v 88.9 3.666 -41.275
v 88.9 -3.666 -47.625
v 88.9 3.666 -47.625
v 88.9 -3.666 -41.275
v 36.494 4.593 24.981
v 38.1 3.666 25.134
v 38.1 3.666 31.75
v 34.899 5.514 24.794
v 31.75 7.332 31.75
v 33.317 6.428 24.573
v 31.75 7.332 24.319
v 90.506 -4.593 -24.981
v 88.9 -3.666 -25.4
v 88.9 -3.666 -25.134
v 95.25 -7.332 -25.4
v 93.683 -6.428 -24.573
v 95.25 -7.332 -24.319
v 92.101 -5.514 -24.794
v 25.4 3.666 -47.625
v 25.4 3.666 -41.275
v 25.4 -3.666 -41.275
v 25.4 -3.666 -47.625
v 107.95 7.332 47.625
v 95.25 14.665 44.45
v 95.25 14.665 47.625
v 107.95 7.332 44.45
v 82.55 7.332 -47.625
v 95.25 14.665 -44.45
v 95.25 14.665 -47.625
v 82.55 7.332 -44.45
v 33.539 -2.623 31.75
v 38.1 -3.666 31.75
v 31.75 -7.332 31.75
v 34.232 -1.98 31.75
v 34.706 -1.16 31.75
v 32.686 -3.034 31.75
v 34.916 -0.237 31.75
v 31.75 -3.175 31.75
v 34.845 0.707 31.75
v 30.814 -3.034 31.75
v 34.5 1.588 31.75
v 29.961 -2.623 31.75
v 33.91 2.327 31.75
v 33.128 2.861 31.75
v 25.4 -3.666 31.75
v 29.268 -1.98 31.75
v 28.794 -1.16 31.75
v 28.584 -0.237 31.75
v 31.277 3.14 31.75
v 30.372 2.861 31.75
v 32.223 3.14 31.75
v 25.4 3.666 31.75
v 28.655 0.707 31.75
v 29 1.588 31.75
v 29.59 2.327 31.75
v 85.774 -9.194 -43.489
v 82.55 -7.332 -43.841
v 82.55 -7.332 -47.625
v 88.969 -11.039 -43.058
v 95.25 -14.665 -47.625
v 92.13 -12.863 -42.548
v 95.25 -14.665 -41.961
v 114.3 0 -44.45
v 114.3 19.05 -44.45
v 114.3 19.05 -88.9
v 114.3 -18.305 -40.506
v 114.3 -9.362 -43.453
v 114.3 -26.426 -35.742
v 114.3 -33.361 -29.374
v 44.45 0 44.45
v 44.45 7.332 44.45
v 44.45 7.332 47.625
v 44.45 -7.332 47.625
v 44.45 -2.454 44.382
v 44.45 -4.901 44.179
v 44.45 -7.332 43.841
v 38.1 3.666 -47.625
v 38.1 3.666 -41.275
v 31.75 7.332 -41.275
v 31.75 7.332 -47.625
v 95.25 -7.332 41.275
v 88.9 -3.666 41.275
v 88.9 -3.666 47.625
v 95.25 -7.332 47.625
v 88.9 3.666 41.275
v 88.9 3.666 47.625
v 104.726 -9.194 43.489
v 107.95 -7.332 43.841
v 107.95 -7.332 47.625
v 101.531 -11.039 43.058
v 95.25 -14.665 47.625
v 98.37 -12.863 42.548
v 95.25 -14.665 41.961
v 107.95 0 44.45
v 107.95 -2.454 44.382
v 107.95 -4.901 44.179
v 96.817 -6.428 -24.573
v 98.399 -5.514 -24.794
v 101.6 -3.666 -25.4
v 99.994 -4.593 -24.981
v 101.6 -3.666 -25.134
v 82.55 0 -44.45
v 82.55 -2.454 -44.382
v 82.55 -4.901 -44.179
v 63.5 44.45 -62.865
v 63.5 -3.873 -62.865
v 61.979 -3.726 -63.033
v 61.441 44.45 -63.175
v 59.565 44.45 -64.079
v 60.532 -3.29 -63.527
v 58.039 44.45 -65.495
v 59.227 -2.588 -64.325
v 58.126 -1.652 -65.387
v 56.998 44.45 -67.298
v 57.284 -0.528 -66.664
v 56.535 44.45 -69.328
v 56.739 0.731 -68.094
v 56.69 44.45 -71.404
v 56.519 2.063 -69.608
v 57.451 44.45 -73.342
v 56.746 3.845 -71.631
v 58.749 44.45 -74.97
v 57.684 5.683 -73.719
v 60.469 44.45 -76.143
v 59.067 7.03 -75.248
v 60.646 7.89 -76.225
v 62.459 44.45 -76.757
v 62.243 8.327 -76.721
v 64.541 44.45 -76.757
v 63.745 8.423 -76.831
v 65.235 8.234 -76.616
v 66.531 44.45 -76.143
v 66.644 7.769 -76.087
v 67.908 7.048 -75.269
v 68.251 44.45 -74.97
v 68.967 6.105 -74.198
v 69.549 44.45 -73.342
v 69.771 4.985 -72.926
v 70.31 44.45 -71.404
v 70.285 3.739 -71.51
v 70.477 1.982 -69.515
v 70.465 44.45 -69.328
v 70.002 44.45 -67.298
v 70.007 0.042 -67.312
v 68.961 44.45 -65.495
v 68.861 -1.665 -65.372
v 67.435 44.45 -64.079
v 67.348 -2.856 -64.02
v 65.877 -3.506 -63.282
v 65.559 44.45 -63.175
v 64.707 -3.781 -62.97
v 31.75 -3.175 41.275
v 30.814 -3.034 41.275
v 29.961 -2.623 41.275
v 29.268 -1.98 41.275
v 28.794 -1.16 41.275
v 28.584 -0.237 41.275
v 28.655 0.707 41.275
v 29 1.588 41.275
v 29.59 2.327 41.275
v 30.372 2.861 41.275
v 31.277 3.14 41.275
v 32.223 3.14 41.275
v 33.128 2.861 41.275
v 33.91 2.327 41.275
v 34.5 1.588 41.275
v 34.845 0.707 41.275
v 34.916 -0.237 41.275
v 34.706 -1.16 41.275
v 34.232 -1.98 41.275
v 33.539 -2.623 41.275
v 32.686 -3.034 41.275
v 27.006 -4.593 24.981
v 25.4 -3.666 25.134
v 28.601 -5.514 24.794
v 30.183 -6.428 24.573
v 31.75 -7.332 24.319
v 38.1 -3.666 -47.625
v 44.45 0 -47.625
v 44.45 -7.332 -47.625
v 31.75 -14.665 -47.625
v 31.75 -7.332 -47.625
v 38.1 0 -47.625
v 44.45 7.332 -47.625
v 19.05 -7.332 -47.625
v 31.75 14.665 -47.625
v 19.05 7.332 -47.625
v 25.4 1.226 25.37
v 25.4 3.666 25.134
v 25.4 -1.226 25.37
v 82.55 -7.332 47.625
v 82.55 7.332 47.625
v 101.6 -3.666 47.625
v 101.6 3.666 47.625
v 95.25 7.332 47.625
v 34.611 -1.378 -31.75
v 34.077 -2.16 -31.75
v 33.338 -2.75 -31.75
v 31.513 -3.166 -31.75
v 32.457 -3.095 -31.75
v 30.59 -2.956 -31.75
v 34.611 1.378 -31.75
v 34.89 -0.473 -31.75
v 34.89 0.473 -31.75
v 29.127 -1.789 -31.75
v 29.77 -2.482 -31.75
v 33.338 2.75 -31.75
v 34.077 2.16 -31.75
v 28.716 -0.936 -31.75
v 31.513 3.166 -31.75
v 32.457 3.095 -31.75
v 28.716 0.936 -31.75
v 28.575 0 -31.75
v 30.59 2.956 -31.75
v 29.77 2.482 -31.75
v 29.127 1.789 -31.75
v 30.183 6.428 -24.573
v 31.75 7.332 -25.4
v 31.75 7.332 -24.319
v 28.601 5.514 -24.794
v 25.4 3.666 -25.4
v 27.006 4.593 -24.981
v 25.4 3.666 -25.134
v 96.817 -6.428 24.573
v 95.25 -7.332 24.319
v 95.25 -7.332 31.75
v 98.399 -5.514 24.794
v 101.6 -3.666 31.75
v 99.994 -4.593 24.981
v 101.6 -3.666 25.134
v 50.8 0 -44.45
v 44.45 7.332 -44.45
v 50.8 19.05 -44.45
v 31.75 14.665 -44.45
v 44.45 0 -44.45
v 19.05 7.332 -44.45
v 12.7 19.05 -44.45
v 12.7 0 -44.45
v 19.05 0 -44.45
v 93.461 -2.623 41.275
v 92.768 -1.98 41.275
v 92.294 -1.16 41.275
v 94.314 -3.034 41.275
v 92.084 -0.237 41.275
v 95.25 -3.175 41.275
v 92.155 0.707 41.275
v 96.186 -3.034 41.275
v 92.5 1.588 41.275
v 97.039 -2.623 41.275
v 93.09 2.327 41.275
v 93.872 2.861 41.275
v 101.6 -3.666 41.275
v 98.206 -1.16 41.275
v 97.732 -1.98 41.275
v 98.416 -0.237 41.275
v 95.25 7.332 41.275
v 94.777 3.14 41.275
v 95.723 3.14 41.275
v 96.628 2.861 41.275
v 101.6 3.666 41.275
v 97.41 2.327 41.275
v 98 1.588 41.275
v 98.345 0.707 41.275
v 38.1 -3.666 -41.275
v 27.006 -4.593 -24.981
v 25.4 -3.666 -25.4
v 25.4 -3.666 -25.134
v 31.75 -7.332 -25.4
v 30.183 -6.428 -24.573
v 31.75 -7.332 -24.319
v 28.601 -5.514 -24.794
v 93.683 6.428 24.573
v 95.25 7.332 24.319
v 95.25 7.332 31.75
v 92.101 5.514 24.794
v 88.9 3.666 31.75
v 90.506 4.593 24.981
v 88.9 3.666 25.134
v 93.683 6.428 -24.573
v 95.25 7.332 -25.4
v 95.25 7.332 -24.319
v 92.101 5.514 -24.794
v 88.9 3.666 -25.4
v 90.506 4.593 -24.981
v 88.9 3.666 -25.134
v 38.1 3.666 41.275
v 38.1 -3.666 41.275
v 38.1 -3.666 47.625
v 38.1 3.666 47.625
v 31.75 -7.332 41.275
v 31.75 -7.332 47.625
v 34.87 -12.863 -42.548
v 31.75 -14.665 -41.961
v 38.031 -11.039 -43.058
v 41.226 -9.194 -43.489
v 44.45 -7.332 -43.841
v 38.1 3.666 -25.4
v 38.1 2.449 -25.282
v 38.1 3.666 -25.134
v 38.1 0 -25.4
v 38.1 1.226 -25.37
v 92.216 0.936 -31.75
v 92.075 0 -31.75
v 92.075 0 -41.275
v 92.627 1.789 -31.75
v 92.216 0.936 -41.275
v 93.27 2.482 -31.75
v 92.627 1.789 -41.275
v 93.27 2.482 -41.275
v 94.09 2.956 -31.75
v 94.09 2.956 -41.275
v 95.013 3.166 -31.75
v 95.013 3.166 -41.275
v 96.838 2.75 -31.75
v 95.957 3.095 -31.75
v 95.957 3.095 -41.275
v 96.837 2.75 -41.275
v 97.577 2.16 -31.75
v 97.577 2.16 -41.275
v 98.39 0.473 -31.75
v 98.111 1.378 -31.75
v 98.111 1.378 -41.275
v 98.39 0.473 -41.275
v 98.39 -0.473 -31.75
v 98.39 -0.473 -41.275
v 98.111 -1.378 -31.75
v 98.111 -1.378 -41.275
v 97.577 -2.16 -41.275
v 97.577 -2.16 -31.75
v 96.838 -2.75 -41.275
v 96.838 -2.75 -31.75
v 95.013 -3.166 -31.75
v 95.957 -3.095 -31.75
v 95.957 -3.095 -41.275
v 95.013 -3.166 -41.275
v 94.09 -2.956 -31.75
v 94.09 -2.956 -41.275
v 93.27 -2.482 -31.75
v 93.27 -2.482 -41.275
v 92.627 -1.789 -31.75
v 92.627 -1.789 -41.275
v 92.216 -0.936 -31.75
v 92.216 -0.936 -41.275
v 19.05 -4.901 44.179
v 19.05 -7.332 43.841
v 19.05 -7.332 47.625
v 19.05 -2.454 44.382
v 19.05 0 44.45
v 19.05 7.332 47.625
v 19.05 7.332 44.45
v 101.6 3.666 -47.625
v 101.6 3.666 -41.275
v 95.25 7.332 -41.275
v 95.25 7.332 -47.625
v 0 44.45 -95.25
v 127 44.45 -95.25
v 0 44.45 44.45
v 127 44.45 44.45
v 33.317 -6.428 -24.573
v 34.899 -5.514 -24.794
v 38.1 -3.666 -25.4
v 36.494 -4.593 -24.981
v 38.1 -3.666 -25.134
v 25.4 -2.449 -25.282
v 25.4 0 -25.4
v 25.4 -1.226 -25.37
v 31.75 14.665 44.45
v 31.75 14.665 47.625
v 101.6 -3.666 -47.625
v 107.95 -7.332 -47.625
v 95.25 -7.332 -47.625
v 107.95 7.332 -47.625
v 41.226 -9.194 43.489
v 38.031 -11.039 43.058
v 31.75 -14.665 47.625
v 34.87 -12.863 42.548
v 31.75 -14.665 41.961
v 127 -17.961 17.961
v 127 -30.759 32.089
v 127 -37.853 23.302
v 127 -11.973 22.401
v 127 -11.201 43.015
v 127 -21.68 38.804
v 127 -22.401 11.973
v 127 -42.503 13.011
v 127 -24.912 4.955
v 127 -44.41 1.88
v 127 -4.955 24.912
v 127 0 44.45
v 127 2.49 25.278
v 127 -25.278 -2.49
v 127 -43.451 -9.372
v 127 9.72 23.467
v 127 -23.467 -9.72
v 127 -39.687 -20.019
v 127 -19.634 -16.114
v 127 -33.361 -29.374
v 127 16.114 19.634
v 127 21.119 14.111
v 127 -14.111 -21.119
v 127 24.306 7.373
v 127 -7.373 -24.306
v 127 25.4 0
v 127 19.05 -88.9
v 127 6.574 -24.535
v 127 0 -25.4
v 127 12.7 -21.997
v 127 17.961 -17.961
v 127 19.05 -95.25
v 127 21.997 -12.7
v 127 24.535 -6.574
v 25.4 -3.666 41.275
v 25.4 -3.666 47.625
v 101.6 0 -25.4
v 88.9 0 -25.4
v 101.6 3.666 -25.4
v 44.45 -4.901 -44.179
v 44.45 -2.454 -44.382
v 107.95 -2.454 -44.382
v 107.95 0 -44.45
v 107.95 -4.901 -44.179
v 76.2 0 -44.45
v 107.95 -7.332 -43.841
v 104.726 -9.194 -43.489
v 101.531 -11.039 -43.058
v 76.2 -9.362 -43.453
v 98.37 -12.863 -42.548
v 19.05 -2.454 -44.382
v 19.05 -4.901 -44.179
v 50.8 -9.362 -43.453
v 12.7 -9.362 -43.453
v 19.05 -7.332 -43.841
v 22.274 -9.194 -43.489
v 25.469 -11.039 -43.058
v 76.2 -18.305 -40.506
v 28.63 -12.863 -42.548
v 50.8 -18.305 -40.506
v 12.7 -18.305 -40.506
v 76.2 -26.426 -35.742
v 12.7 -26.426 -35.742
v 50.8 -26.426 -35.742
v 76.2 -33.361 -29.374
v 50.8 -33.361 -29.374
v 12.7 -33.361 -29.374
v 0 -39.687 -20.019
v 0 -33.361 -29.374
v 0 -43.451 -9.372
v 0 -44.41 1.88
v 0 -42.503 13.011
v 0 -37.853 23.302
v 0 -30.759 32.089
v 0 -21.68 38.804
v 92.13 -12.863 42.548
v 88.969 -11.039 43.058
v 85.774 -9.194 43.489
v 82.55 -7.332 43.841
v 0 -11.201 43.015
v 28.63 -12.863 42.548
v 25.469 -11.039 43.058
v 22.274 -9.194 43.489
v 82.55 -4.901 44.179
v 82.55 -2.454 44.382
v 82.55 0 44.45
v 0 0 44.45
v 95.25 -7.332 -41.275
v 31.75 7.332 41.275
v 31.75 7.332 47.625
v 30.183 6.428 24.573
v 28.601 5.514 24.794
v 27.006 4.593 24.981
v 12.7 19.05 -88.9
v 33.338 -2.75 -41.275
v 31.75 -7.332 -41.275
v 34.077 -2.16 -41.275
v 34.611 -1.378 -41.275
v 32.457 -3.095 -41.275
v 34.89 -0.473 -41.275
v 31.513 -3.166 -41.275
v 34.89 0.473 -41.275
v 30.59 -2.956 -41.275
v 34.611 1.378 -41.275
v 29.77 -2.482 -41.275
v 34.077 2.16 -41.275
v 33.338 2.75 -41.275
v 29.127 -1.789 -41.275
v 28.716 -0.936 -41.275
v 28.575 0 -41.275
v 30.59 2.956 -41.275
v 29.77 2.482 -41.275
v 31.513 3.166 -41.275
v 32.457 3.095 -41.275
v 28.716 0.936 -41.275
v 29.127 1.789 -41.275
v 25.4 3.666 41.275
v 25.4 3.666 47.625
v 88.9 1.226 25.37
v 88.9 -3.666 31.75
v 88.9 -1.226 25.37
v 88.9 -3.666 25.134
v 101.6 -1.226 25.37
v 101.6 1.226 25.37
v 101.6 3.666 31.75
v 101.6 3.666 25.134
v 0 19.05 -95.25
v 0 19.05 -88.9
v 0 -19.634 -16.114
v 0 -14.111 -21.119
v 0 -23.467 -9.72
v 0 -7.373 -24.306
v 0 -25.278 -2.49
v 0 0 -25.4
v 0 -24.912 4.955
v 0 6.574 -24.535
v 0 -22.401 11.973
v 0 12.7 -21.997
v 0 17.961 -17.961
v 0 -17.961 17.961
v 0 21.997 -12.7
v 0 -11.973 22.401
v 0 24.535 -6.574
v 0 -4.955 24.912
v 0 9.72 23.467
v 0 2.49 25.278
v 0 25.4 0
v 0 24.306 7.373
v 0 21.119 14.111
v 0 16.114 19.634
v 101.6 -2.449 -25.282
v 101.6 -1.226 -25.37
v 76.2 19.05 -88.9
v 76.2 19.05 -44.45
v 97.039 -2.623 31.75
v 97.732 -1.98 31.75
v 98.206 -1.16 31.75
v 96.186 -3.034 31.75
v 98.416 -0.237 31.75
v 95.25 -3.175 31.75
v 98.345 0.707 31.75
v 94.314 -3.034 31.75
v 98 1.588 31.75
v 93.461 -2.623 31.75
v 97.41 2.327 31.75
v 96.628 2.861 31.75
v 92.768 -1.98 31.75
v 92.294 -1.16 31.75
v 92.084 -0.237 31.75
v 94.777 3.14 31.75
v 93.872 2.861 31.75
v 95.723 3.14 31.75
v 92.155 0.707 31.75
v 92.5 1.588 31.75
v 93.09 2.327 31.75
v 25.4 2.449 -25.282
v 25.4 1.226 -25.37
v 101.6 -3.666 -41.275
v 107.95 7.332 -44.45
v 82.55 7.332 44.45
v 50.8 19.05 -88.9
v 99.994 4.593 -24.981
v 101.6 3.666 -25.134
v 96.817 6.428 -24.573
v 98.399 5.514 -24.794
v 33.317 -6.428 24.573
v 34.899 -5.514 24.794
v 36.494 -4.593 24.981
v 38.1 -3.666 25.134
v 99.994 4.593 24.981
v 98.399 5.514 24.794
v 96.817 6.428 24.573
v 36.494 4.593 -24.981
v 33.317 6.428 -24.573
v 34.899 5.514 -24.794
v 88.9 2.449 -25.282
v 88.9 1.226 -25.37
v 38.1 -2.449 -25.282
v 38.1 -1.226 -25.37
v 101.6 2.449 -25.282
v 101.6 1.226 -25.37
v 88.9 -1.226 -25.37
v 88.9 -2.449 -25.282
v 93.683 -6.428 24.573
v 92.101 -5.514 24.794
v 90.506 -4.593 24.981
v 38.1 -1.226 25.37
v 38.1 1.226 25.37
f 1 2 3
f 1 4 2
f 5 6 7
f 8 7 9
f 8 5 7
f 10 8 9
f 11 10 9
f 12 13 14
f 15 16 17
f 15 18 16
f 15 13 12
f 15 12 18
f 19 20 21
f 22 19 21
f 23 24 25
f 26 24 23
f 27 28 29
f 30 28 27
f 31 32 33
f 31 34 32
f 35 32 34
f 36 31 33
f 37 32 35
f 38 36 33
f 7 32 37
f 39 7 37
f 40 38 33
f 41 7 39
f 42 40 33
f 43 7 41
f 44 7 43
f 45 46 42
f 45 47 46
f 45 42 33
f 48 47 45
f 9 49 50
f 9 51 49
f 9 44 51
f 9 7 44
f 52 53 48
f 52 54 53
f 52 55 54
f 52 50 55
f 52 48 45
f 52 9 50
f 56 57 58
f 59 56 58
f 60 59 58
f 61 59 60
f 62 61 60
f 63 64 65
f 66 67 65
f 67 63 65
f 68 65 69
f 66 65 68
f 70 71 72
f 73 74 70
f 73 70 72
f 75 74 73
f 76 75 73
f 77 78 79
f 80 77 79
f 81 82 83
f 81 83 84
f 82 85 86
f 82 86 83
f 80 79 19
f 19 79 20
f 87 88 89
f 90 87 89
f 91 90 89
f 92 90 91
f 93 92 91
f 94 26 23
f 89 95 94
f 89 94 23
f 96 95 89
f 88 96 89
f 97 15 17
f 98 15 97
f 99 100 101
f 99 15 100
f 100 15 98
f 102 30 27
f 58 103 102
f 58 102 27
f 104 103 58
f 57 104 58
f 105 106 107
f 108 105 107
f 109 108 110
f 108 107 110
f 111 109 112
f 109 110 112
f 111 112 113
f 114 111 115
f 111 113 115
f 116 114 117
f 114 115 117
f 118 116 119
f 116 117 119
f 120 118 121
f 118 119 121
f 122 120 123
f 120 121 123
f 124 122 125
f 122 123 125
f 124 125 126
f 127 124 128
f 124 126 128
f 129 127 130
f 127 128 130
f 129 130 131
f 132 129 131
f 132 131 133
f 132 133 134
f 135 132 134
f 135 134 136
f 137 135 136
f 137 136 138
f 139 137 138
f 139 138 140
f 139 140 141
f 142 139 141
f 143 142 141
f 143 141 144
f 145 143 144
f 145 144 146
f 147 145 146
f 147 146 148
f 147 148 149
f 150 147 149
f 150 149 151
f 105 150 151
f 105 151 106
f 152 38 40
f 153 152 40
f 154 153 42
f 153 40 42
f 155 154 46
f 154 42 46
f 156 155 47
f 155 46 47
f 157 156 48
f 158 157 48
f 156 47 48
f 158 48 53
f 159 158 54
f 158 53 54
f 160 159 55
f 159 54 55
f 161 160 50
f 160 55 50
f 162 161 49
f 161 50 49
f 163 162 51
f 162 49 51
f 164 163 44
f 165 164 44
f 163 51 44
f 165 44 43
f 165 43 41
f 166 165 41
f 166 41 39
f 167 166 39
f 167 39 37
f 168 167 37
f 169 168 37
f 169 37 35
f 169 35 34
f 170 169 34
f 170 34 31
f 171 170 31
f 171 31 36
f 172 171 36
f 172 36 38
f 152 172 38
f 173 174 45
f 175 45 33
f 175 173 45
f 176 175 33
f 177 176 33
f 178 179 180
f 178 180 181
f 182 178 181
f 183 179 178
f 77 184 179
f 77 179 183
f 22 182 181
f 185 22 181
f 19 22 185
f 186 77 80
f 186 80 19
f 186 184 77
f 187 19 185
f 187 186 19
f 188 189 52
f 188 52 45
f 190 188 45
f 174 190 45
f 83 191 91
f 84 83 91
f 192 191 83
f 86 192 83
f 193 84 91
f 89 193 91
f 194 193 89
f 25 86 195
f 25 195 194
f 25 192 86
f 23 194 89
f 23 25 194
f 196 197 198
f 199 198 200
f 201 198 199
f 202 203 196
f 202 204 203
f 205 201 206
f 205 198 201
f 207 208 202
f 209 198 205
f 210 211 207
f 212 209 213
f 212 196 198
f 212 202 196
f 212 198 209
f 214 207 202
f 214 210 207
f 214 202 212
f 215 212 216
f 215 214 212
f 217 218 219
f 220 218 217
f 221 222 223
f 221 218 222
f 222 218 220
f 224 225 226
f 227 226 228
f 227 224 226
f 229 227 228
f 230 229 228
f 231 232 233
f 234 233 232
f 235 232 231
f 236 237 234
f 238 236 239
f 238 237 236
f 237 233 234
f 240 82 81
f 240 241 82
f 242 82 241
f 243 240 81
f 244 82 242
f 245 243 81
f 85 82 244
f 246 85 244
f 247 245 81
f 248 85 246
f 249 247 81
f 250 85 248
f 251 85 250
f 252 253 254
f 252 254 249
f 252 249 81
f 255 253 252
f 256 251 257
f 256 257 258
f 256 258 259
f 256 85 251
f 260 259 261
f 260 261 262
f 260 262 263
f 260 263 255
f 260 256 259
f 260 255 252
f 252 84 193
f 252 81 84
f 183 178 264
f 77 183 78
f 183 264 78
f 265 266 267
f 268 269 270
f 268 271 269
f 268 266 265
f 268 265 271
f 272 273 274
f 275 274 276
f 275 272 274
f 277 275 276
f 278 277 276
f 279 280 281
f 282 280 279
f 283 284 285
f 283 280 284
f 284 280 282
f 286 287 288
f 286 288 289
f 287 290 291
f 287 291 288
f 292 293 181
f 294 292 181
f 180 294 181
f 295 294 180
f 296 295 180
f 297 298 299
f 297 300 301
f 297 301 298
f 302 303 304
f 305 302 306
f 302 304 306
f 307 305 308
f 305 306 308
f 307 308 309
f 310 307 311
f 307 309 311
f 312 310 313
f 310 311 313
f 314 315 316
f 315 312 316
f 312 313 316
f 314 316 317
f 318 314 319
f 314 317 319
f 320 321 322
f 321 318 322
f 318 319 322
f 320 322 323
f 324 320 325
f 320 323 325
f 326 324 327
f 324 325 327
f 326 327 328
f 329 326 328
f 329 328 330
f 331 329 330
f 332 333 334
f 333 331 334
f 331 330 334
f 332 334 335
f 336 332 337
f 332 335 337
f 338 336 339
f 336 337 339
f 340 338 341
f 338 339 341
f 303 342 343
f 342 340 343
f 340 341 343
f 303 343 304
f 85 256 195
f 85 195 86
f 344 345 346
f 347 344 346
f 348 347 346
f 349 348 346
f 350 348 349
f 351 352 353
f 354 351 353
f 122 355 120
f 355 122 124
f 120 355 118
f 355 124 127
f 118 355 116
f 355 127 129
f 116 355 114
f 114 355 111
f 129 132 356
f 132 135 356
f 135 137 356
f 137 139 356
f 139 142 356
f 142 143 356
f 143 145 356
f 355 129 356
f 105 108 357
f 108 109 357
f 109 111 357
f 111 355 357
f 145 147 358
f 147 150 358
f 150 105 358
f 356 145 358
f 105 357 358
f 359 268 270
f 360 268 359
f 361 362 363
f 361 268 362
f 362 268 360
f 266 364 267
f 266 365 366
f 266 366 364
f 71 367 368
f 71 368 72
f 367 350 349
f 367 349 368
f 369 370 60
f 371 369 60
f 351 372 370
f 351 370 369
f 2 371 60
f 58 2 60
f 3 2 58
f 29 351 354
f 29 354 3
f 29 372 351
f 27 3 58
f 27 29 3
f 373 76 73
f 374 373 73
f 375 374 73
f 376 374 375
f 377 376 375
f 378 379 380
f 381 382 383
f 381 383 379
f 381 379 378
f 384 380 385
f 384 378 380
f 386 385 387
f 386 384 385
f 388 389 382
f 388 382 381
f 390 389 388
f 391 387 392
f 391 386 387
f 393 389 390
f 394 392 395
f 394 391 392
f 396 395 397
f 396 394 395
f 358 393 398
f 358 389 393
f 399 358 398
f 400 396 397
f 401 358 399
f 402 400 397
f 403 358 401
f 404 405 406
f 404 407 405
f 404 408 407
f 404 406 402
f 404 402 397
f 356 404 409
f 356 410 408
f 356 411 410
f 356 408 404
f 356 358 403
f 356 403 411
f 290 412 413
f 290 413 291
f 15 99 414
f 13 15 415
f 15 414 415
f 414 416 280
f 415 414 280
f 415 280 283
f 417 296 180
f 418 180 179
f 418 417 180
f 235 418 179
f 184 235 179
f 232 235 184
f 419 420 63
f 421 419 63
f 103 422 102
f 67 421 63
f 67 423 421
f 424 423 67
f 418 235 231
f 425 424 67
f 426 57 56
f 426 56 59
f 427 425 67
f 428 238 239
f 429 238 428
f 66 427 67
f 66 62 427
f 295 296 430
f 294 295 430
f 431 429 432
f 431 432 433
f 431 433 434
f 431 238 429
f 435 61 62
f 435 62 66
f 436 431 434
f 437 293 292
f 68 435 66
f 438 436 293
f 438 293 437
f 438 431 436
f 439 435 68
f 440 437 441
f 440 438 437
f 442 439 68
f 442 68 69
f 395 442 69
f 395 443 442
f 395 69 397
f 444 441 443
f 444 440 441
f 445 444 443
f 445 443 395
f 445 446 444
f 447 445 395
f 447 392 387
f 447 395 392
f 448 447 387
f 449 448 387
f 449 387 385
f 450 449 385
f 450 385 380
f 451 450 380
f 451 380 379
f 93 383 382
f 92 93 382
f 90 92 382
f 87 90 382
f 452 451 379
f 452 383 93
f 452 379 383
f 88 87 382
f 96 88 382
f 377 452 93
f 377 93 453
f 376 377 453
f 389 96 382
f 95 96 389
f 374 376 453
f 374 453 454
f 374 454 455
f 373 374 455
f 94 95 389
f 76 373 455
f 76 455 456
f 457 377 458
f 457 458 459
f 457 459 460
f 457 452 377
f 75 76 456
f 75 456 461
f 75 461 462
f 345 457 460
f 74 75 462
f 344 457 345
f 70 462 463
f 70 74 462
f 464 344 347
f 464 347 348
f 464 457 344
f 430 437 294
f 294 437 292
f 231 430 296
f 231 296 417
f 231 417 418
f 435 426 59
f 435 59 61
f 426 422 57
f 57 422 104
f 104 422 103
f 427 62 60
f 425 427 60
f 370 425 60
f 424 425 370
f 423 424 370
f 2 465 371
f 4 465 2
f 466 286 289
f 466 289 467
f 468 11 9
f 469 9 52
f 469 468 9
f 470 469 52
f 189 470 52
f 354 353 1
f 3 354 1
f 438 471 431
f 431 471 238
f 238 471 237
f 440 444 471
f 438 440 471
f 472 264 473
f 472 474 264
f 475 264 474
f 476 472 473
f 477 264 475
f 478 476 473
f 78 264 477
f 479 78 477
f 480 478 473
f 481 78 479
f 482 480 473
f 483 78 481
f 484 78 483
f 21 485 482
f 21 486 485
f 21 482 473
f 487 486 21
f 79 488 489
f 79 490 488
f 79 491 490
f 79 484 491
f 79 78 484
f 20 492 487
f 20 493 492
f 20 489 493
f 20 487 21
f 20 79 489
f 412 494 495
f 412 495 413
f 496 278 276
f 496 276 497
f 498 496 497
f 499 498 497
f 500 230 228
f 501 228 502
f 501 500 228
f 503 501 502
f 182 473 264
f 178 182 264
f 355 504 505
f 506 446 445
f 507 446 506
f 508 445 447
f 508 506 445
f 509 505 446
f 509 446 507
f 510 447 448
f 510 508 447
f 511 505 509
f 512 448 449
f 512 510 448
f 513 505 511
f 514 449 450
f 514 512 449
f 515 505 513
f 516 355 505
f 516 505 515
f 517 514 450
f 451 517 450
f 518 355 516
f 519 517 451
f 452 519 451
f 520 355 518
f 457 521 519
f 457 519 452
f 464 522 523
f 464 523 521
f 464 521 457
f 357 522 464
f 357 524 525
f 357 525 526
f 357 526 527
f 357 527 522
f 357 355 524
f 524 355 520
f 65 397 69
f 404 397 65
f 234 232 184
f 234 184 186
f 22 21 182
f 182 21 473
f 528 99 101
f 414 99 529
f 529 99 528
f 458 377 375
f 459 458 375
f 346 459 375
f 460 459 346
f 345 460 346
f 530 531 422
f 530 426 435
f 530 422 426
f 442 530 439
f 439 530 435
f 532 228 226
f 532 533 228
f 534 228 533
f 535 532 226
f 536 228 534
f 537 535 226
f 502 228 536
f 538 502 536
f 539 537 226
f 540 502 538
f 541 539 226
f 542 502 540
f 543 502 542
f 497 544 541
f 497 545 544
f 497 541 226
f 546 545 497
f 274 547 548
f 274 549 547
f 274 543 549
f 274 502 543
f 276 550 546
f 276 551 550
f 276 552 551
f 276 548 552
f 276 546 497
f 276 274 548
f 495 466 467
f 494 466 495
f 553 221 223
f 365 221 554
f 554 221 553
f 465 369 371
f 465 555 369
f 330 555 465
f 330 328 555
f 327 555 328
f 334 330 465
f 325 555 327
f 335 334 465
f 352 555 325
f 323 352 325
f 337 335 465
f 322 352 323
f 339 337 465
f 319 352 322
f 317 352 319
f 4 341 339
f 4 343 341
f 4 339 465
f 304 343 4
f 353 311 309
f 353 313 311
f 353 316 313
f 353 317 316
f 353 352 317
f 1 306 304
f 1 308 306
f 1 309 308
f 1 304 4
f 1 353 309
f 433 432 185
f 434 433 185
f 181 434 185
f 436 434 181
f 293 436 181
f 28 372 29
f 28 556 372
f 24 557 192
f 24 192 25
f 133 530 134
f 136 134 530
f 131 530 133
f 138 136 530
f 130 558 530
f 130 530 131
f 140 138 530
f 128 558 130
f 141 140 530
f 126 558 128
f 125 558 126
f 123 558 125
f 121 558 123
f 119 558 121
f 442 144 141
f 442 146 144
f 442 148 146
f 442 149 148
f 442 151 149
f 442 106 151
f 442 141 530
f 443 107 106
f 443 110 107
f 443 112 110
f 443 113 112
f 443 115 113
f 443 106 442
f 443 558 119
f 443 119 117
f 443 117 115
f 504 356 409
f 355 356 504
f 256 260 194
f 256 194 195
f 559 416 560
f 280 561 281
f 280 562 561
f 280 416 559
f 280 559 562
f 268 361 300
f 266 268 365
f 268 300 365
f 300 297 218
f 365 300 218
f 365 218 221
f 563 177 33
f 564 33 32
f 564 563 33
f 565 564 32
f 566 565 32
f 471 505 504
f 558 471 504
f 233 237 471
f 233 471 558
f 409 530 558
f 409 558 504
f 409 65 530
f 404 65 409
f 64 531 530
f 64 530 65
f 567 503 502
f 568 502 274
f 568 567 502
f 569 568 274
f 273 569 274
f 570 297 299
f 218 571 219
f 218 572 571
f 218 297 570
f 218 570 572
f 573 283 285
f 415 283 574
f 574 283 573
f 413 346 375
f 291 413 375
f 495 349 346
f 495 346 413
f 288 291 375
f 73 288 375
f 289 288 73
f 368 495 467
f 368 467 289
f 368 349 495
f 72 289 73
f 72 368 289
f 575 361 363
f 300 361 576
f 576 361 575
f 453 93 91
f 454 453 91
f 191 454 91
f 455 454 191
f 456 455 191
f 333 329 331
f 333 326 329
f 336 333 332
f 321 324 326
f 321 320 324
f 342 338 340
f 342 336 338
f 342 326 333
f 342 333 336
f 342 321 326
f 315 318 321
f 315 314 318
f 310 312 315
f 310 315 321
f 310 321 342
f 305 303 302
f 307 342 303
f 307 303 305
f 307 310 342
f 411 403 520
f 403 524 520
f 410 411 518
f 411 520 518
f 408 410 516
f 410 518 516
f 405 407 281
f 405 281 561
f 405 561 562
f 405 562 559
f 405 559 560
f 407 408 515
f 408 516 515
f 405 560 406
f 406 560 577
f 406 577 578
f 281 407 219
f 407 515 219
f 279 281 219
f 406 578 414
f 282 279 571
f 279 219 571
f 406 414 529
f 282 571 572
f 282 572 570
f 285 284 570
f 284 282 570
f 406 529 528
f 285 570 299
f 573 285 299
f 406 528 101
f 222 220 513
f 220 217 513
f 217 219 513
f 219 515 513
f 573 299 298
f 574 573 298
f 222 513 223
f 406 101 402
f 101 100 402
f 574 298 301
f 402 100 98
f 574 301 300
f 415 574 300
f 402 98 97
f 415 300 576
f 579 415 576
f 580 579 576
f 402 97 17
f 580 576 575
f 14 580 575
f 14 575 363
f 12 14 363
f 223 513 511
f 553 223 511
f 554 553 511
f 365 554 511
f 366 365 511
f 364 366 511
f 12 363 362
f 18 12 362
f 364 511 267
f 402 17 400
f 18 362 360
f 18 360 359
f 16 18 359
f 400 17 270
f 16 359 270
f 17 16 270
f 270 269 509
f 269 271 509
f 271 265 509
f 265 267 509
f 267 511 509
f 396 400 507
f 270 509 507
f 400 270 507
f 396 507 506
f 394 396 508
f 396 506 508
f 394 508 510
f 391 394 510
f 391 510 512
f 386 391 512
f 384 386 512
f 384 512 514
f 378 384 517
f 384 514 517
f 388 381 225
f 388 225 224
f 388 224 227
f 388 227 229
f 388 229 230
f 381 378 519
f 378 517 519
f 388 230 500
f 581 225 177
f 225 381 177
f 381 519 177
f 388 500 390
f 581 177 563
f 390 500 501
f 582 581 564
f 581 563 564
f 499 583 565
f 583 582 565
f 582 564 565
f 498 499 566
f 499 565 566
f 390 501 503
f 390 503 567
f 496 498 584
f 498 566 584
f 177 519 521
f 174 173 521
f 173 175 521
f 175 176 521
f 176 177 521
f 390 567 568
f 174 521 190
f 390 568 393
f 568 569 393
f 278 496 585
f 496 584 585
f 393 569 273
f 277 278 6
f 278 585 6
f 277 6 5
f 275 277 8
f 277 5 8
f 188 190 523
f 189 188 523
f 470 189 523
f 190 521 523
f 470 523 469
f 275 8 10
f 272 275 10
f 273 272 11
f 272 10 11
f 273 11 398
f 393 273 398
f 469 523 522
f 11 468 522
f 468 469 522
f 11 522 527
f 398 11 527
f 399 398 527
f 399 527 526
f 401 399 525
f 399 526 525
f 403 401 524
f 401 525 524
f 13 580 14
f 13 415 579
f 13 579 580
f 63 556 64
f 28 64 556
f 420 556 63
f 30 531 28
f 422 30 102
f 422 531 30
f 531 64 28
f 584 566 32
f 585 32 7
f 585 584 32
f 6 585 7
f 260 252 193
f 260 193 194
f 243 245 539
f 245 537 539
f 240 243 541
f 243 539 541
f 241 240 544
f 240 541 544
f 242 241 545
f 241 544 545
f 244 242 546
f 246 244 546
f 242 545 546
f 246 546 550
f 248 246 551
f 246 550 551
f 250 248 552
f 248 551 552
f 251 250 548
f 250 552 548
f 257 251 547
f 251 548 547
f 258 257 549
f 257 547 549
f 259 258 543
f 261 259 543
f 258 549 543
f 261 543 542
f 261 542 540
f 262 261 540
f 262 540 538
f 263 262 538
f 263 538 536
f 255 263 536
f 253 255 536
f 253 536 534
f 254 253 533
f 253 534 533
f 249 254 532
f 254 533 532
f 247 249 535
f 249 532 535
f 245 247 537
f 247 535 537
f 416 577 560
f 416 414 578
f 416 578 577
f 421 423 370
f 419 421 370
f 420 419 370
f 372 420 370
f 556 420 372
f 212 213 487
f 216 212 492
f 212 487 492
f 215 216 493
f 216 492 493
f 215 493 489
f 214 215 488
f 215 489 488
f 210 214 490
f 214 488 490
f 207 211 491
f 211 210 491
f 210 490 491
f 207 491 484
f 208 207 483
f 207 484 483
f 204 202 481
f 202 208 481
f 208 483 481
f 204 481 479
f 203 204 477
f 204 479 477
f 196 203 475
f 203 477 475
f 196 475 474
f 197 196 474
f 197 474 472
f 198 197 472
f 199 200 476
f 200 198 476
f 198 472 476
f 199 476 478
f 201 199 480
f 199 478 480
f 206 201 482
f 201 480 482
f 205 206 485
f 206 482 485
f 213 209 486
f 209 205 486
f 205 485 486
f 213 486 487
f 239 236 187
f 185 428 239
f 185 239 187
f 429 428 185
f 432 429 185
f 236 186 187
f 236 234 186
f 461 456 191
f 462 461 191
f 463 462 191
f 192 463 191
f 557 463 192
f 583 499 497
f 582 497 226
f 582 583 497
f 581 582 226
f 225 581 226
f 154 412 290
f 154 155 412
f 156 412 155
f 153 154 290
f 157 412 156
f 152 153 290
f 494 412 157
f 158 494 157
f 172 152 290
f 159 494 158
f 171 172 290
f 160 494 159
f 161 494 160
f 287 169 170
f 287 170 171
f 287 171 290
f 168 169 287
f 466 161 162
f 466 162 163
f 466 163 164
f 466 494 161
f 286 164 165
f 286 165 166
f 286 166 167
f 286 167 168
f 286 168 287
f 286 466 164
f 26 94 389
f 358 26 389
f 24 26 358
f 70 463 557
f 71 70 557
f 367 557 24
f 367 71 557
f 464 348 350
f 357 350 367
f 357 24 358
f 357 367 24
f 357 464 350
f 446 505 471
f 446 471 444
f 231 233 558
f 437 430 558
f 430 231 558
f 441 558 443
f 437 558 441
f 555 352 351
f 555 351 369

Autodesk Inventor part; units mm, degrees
ref_plane "YZ Plane" through (0, 0, 0) normal (1, 0, 0) x (0, 1, 0)
sketch "Sketch2" plane through (0, 0, 0) normal (1, 0, 0) x (0, 1, 0)
  circle A0 centre (0, 0) radius 25.4
  arc A1 (0, 44.45) -> (0, -44.45) centre (0, 0) ccw
  line L0 (0, -44.45) -> (0, 25.4)
  line L1 (0, 44.45) -> (44.45, 44.45)
  line L2 (44.45, 44.45) -> (44.45, -44.45)
  line L3 (44.45, -44.45) -> (0, -44.45)
  dimension "d0" = 50.8
  dimension "d2" = 88.9
  dimension "d3" = 44.45
extrude "Extrusion1" add sketch "Sketch2" along normal blind 127
sketch "Sketch3" plane through (0, 0, 44.45) normal (0, 0, 1) x (1, 0, 0)
  line L0 (0, 0) -> (127, 0) projected
  line L1 (0, 0) -> (127, 0)
  line L2 (63.5, 0) -> (0, 0)
  line L3 (63.5, 0) -> (127, 0)
  circle A0 centre (31.75, 0) radius 4.2333
  circle A1 centre (95.25, 0) radius 4.2333
  dimension "d6" = 8.4667
  dimension "d7" = 8.4667
hole "Hole1" at (95.25, 0, 44.45) at (31.75, 0, 44.45) direction (0, 0, -1) diameter 6.35 end through all
ref_plane "Work Plane1" through (0, 0, -25.4) normal (0, 0, -1) x (-1, 0, 0)
sketch "Sketch4" plane through (0, 0, -25.4) normal (0, 0, -1) x (-1, 0, 0)
  arc A0 (-92.075, 0) -> (-98.425, 0) centre (-95.25, 0) ccw projected
  arc A1 (-28.575, 0) -> (-34.925, 0) centre (-31.75, 0) ccw projected
  line L0 (-95.25, 0) -> (-101.6, 0)
  line L1 (-101.6, 3.6662) -> (-95.25, 7.3323)
  line L2 (-95.25, 7.3323) -> (-88.9, 3.6662)
  line L3 (-88.9, 3.6662) -> (-88.9, -3.6662)
  line L4 (-88.9, -3.6662) -> (-95.25, -7.3323)
  line L5 (-95.25, -7.3323) -> (-101.6, -3.6662)
  line L6 (-101.6, -3.6662) -> (-101.6, 3.6662)
  line L7 (-31.75, 0) -> (-25.4, 0)
  line L8 (-25.4, -3.6662) -> (-31.75, -7.3323)
  line L9 (-31.75, -7.3323) -> (-38.1, -3.6662)
  line L10 (-38.1, -3.6662) -> (-38.1, 3.6662)
  line L11 (-38.1, 3.6662) -> (-31.75, 7.3323)
  line L12 (-31.75, 7.3323) -> (-25.4, 3.6662)
  line L13 (-25.4, 3.6662) -> (-25.4, -3.6662)
  point P0 (0, 0)
  dimension "d15" = 6.35
extrude "Extrusion2" add sketch "Sketch4" along normal blind 6.35
extrude "Extrusion3" cut sketch "Sketch4" against normal blind 57.15
sketch "Sketch5" plane through (0, 0, -44.45) normal (0, 0, -1) x (-1, 0, 0)
  line L0 (-101.6, 3.6662) -> (-95.25, 7.3323) projected
  line L1 (-95.25, 7.3323) -> (-88.9, 3.6662) projected
  line L2 (-88.9, 3.6662) -> (-88.9, -3.6662) projected
  line L3 (-34.925, 0) -> (-92.075, 0) projected
  line L4 (0, 0) -> (-28.575, 0) projected
  line L5 (0, 0) -> (0, 0) projected
  line L6 (0, 0) -> (-28.575, 0) projected
  line L7 (-34.925, 0) -> (-92.075, 0) projected
  line L8 (-98.425, 0) -> (-127, 0) projected
  line L9 (-127, 0) -> (-127, 0) projected
  line L10 (-98.425, 0) -> (-127, 0) projected
  line L11 (-88.9, -3.6662) -> (-95.25, -7.3323) projected
  line L12 (-95.25, -7.3323) -> (-101.6, -3.6662) projected
  line L13 (-101.6, -3.6662) -> (-101.6, 3.6662) projected
  line L14 (-38.1, 3.6662) -> (-31.75, 7.3323) projected
  line L15 (-25.4, -3.6662) -> (-31.75, -7.3323) projected
  line L16 (-31.75, 7.3323) -> (-25.4, 3.6662) projected
  line L17 (-25.4, 3.6662) -> (-25.4, -3.6662) projected
  line L18 (-38.1, -3.6662) -> (-38.1, 3.6662) projected
  line L19 (-31.75, -7.3323) -> (-38.1, -3.6662) projected
extrude "Extrusion4" cut sketch "Sketch5" against normal blind 3.175
sketch "Sketch6" plane through (0, 0, 44.45) normal (0, 0, 1) x (1, 0, 0)
  line L0 (25.4, 0) -> (25.4, -3.6662) projected
  line L1 (25.4, -3.6662) -> (31.75, -7.3323) projected
  line L2 (31.75, -7.3323) -> (38.1, -3.6662) projected
  line L3 (38.1, -3.6662) -> (38.1, 0) projected
  line L4 (38.1, 0) -> (88.9, 0) projected
  line L5 (88.9, 0) -> (88.9, -3.6662) projected
  line L6 (88.9, -3.6662) -> (95.25, -7.3323) projected
  line L7 (95.25, -7.3323) -> (101.6, -3.6662) projected
  line L8 (101.6, -3.6662) -> (101.6, 0) projected
  line L9 (101.6, 0) -> (127, 0) projected
  line L10 (127, 0) -> (127, 0) projected
  line L11 (98.425, 0) -> (127, 0) projected
  line L12 (34.925, 0) -> (92.075, 0) projected
  line L13 (0, 0) -> (28.575, 0) projected
  line L14 (0, 0) -> (0, 0) projected
  line L15 (0, 0) -> (25.4, 0) projected
  line L16 (38.1, 3.6662) -> (31.75, 7.3323) projected
  line L17 (38.1, -3.6662) -> (38.1, 3.6662) projected
  line L18 (31.75, 7.3323) -> (25.4, 3.6662) projected
  line L19 (25.4, 3.6662) -> (25.4, -3.6662) projected
  line L20 (88.9, 3.6662) -> (88.9, -3.6662) projected
  line L21 (95.25, 7.3323) -> (88.9, 3.6662) projected
  line L22 (101.6, 3.6662) -> (95.25, 7.3323) projected
  line L23 (101.6, -3.6662) -> (101.6, 3.6662) projected
extrude "Extrusion5" cut sketch "Sketch6" against normal blind 3.175
sketch "Sketch7" plane through (0, 0, -44.45) normal (0, 0, -1) x (-1, 0, 0)
  line L0 (-101.6, 0) -> (-127, 0) projected
  line L1 (-101.6, 0) -> (-101.6, 3.6662) projected
  line L2 (-101.6, 3.6662) -> (-95.25, 7.3323) projected
  line L3 (-95.25, 7.3323) -> (-88.9, 3.6662) projected
  line L4 (-88.9, 3.6662) -> (-88.9, 0) projected
  line L5 (-38.1, 0) -> (-88.9, 0) projected
  line L6 (-95.25, 0) -> (-107.95, 0)
  line L7 (-31.75, 0) -> (-44.45, 0)
  line L8 (-107.95, 7.3323) -> (-95.25, 14.6647)
  line L9 (-95.25, 14.6647) -> (-82.55, 7.3323)
  line L10 (-82.55, 7.3323) -> (-82.55, -7.3323)
  line L11 (-82.55, -7.3323) -> (-95.25, -14.6647)
  line L12 (-95.25, -14.6647) -> (-107.95, -7.3323)
  line L13 (-107.95, -7.3323) -> (-107.95, 7.3323)
  line L14 (-44.45, 7.3323) -> (-31.75, 14.6647)
  line L15 (-31.75, 14.6647) -> (-19.05, 7.3323)
  line L16 (-19.05, 7.3323) -> (-19.05, -7.3323)
  line L17 (-19.05, -7.3323) -> (-31.75, -14.6647)
  line L18 (-31.75, -14.6647) -> (-44.45, -7.3323)
  line L19 (-44.45, -7.3323) -> (-44.45, 7.3323)
  line L20 (-95.25, -7.3323) -> (-88.9, -3.6662) projected
  line L21 (-88.9, -3.6662) -> (-88.9, 0) projected
  line L22 (-101.6, -3.6662) -> (-95.25, -7.3323) projected
  line L23 (-101.6, 0) -> (-101.6, -3.6662) projected
  circle A0 centre (-31.75, 0) radius 3.175 projected
  line L24 (-38.1, 3.6662) -> (-31.75, 7.3323) projected
  line L25 (-38.1, -3.6662) -> (-38.1, 3.6662) projected
  line L26 (-31.75, -7.3323) -> (-38.1, -3.6662) projected
  line L27 (-25.4, -3.6662) -> (-31.75, -7.3323) projected
  line L28 (-25.4, 3.6662) -> (-25.4, -3.6662) projected
  line L29 (-31.75, 7.3323) -> (-25.4, 3.6662) projected
  dimension "d24" = 12.7
  dimension "d25" = 12.7
extrude "Extrusion6" add sketch "Sketch7" along normal mid plane 6.35 contours L23 L22 L20 L21 L5 L10 L11 L12 L13 L0 | L0 L13 L8 L9 L10 L5 L4 L3 L2 L1 | L19 L14 L15 L16 L17 L18
sketch "Sketch8" plane through (0, 0, 44.45) normal (0, 0, 1) x (1, 0, 0)
  line L0 (101.6, 3.6662) -> (95.25, 7.3323) projected
  line L1 (95.25, 7.3323) -> (88.9, 3.6662) projected
  line L2 (88.9, 3.6662) -> (88.9, -3.6662) projected
  line L3 (88.9, -3.6662) -> (95.25, -7.3323) projected
  line L4 (95.25, -7.3323) -> (101.6, -3.6662) projected
  line L5 (101.6, -3.6662) -> (101.6, 3.6662) projected
  line L6 (107.95, 7.3323) -> (107.95, -7.3323) projected
  line L7 (107.95, -7.3323) -> (95.25, -14.6647) projected
  line L8 (95.25, -14.6647) -> (82.55, -7.3323) projected
  line L9 (82.55, -7.3323) -> (82.55, 7.3323) projected
  line L10 (82.55, 7.3323) -> (95.25, 14.6647) projected
  line L11 (95.25, 14.6647) -> (107.95, 7.3323) projected
  line L12 (31.75, 7.3323) -> (25.4, 3.6662) projected
  line L13 (25.4, 3.6662) -> (25.4, -3.6662) projected
  line L14 (25.4, -3.6662) -> (31.75, -7.3323) projected
  line L15 (31.75, -7.3323) -> (38.1, -3.6662) projected
  line L16 (38.1, -3.6662) -> (38.1, 3.6662) projected
  line L17 (38.1, 3.6662) -> (31.75, 7.3323) projected
  line L18 (44.45, 7.3323) -> (44.45, -7.3323) projected
  line L19 (44.45, -7.3323) -> (31.75, -14.6647) projected
  line L20 (31.75, -14.6647) -> (19.05, -7.3323) projected
  line L21 (19.05, -7.3323) -> (19.05, 7.3323) projected
  line L22 (19.05, 7.3323) -> (31.75, 14.6647) projected
  line L23 (31.75, 14.6647) -> (44.45, 7.3323) projected
extrude "Extrusion7" add sketch "Sketch8" along normal mid plane 6.35
sketch "Sketch11" plane through (0, 0, -44.45) normal (0, 0, -1) x (-1, 0, 0)
  line L0 (-107.95, 0) -> (-107.95, 7.3323) projected
  line L1 (-107.95, 7.3323) -> (-95.25, 14.6647) projected
  line L2 (-95.25, 14.6647) -> (-82.55, 7.3323) projected
  line L3 (-82.55, 7.3323) -> (-82.55, 0) projected
  line L4 (-44.45, 0) -> (-82.55, 0) projected
  line L5 (-44.45, 0) -> (-44.45, 7.3323) projected
  line L6 (-44.45, 7.3323) -> (-31.75, 14.6647) projected
  line L7 (-31.75, 14.6647) -> (-19.05, 7.3323) projected
  line L8 (-19.05, 7.3323) -> (-19.05, 0) projected
  line L9 (0, 0) -> (-19.05, 0) projected
  line L10 (0, 0) -> (0, 44.45) projected
  line L11 (0, 44.45) -> (-127, 44.45) projected
  line L12 (-127, 0) -> (-127, 44.45) projected
  line L13 (-107.95, 0) -> (-127, 0) projected
  line L14 (-127, 44.45) -> (0, 44.45)
  line L15 (0, 44.45) -> (0, 19.05)
  line L16 (0, 19.05) -> (-127, 19.05)
  line L17 (-127, 19.05) -> (-127, 44.45)
extrude "Extrusion9" add sketch "Sketch11" along normal blind 50.8 contours L12 L11 L10 L16
ref_plane "Work Plane2" through (63.5, 0, 0) normal (1, 0, 0) x (0, 0, -1)
sketch "Sketch13" plane through (63.5, 0, 0) normal (1, 0, 0) x (0, 0, -1)
  circle A0 centre (0, 0) radius 25.4 projected
  arc A1 (-44.45, 0) -> (44.45, 0) centre (0, 0) ccw projected
  line L0 (44.45, 0) -> (44.45, 19.05) projected
  line L1 (44.45, 19.05) -> (95.25, 19.05) projected
  line L2 (95.25, 44.45) -> (95.25, 19.05) projected
  line L3 (-44.45, 44.45) -> (95.25, 44.45) projected
  line L4 (-44.45, 44.45) -> (-44.45, 0) projected
  line L5 (95.25, 19.05) -> (88.9, 19.05)
  line L6 (88.9, 19.05) -> (29.3739, -33.3613)
  dimension "d65" = 6.35
extrude "Extrusion10" add sketch "Sketch13" along normal mid plane 25.4 contours A1 L0 L1 L6
sketch "Sketch14" plane through (127, 0, 0) normal (1, 0, 0) x (0, 0, -1)
  arc A0 (29.3739, -33.3613) -> (44.45, 0) centre (0, 0) ccw projected
  line L0 (29.3739, -33.3613) -> (88.9, 19.05) projected
  line L1 (44.45, 19.05) -> (88.9, 19.05) projected
  line L2 (44.45, 0) -> (44.45, 19.05) projected
  circle A1 centre (0, 0) radius 25.4 projected
  arc A2 (-44.45, 0) -> (44.45, 0) centre (0, 0) ccw projected
  line L3 (44.45, 0) -> (44.45, 19.05) projected
  line L4 (44.45, 19.05) -> (95.25, 19.05) projected
  line L5 (95.25, 44.45) -> (95.25, 19.05) projected
  line L6 (-44.45, 44.45) -> (95.25, 44.45) projected
  line L7 (-44.45, 44.45) -> (-44.45, 0) projected
extrude "Extrusion11" add sketch "Sketch14" against normal blind 12.7 contours A0 L2 L1 L0
sketch "Sketch15" plane through (0, 0, 0) normal (-1, 0, 0) x (0, 0, 1)
  arc A0 (-44.45, 0) -> (-29.3739, -33.3613) centre (0, 0) ccw projected
  line L0 (-44.45, 19.05) -> (-44.45, 0) projected
  line L1 (-88.9, 19.05) -> (-44.45, 19.05) projected
  line L2 (-88.9, 19.05) -> (-29.3739, -33.3613) projected
  circle A1 centre (0, 0) radius 25.4 projected
  arc A2 (-44.45, 0) -> (44.45, 0) centre (0, 0) ccw projected
  line L3 (44.45, 44.45) -> (44.45, 0) projected
  line L4 (44.45, 44.45) -> (-95.25, 44.45) projected
  line L5 (-95.25, 19.05) -> (-95.25, 44.45) projected
  line L6 (-44.45, 19.05) -> (-95.25, 19.05) projected
  line L7 (-44.45, 0) -> (-44.45, 19.05) projected
extrude "Extrusion12" add sketch "Sketch15" against normal blind 12.7 contours A0 L2 L1 L0
sketch "Sketch16" plane through (0, 44.45, 44.45) normal (0, 1, 0) x (1, 0, 0)
  line L0 (0, 0) -> (0, 139.7) projected
  line L1 (127, 0) -> (127, 139.7) projected
  line L2 (107.95, 88.9) -> (114.3, 88.9) projected
  line L3 (107.95, 88.9) -> (95.25, 88.9) projected
  line L4 (95.25, 88.9) -> (82.55, 88.9) projected
  line L5 (76.2, 88.9) -> (82.55, 88.9) projected
  line L6 (76.2, 88.9) -> (114.3, 88.9) projected
  line L7 (114.3, 88.9) -> (127, 88.9)
  line L8 (127, 88.9) -> (0, 88.9)
  line L9 (0, 88.9) -> (127, 88.9)
  line L10 (127, 88.9) -> (127, 139.7)
  line L11 (127, 139.7) -> (0, 139.7)
  line L12 (0, 139.7) -> (0, 88.9)
  circle A0 centre (63.5, 114.3) radius 6.985
  point P0 (0, 44.45)
  dimension "d72" = 13.97
hole "Hole3" at (63.5, 44.45, -69.85) direction (0, -1, 0) diameter 13.97 end through all
sketch "Sketch17" plane through (63.5, 0, 0) normal (1, 0, 0) x (0, 0, -1)
  line L0 (62.865, 44.45) -> (76.835, 44.45) projected
  line L1 (62.865, 44.45) -> (43.815, 44.45)
  line L2 (69.85, 44.45) -> (69.85, 57.15)
  line L3 (69.85, 57.15) -> (43.815, 44.45)
  point P0 (0, 0)
  dimension "d81" = 19.05
  dimension "d82" = 12.7
properties part number "bike_gipper"
